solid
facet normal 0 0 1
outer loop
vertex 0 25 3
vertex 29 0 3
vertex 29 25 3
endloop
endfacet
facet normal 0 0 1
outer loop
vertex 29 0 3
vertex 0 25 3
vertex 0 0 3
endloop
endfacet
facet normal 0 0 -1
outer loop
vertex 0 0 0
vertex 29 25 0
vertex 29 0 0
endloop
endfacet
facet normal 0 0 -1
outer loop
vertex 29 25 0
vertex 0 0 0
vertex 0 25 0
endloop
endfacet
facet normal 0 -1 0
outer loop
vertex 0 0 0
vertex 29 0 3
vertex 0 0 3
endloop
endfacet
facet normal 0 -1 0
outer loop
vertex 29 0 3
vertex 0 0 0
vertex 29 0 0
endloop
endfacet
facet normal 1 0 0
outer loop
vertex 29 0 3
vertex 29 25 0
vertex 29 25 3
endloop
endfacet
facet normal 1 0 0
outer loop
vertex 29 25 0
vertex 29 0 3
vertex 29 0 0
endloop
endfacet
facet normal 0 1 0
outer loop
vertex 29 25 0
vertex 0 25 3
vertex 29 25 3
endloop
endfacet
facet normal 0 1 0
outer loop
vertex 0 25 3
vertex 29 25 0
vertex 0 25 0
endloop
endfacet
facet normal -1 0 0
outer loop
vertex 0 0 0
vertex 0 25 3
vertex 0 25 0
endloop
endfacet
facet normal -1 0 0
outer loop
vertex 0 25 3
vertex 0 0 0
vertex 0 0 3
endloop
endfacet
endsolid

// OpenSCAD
$fn=360;
x=29;
y=25;
z=3;
  translate([0,0,0])
  cube([x,y,z]);
